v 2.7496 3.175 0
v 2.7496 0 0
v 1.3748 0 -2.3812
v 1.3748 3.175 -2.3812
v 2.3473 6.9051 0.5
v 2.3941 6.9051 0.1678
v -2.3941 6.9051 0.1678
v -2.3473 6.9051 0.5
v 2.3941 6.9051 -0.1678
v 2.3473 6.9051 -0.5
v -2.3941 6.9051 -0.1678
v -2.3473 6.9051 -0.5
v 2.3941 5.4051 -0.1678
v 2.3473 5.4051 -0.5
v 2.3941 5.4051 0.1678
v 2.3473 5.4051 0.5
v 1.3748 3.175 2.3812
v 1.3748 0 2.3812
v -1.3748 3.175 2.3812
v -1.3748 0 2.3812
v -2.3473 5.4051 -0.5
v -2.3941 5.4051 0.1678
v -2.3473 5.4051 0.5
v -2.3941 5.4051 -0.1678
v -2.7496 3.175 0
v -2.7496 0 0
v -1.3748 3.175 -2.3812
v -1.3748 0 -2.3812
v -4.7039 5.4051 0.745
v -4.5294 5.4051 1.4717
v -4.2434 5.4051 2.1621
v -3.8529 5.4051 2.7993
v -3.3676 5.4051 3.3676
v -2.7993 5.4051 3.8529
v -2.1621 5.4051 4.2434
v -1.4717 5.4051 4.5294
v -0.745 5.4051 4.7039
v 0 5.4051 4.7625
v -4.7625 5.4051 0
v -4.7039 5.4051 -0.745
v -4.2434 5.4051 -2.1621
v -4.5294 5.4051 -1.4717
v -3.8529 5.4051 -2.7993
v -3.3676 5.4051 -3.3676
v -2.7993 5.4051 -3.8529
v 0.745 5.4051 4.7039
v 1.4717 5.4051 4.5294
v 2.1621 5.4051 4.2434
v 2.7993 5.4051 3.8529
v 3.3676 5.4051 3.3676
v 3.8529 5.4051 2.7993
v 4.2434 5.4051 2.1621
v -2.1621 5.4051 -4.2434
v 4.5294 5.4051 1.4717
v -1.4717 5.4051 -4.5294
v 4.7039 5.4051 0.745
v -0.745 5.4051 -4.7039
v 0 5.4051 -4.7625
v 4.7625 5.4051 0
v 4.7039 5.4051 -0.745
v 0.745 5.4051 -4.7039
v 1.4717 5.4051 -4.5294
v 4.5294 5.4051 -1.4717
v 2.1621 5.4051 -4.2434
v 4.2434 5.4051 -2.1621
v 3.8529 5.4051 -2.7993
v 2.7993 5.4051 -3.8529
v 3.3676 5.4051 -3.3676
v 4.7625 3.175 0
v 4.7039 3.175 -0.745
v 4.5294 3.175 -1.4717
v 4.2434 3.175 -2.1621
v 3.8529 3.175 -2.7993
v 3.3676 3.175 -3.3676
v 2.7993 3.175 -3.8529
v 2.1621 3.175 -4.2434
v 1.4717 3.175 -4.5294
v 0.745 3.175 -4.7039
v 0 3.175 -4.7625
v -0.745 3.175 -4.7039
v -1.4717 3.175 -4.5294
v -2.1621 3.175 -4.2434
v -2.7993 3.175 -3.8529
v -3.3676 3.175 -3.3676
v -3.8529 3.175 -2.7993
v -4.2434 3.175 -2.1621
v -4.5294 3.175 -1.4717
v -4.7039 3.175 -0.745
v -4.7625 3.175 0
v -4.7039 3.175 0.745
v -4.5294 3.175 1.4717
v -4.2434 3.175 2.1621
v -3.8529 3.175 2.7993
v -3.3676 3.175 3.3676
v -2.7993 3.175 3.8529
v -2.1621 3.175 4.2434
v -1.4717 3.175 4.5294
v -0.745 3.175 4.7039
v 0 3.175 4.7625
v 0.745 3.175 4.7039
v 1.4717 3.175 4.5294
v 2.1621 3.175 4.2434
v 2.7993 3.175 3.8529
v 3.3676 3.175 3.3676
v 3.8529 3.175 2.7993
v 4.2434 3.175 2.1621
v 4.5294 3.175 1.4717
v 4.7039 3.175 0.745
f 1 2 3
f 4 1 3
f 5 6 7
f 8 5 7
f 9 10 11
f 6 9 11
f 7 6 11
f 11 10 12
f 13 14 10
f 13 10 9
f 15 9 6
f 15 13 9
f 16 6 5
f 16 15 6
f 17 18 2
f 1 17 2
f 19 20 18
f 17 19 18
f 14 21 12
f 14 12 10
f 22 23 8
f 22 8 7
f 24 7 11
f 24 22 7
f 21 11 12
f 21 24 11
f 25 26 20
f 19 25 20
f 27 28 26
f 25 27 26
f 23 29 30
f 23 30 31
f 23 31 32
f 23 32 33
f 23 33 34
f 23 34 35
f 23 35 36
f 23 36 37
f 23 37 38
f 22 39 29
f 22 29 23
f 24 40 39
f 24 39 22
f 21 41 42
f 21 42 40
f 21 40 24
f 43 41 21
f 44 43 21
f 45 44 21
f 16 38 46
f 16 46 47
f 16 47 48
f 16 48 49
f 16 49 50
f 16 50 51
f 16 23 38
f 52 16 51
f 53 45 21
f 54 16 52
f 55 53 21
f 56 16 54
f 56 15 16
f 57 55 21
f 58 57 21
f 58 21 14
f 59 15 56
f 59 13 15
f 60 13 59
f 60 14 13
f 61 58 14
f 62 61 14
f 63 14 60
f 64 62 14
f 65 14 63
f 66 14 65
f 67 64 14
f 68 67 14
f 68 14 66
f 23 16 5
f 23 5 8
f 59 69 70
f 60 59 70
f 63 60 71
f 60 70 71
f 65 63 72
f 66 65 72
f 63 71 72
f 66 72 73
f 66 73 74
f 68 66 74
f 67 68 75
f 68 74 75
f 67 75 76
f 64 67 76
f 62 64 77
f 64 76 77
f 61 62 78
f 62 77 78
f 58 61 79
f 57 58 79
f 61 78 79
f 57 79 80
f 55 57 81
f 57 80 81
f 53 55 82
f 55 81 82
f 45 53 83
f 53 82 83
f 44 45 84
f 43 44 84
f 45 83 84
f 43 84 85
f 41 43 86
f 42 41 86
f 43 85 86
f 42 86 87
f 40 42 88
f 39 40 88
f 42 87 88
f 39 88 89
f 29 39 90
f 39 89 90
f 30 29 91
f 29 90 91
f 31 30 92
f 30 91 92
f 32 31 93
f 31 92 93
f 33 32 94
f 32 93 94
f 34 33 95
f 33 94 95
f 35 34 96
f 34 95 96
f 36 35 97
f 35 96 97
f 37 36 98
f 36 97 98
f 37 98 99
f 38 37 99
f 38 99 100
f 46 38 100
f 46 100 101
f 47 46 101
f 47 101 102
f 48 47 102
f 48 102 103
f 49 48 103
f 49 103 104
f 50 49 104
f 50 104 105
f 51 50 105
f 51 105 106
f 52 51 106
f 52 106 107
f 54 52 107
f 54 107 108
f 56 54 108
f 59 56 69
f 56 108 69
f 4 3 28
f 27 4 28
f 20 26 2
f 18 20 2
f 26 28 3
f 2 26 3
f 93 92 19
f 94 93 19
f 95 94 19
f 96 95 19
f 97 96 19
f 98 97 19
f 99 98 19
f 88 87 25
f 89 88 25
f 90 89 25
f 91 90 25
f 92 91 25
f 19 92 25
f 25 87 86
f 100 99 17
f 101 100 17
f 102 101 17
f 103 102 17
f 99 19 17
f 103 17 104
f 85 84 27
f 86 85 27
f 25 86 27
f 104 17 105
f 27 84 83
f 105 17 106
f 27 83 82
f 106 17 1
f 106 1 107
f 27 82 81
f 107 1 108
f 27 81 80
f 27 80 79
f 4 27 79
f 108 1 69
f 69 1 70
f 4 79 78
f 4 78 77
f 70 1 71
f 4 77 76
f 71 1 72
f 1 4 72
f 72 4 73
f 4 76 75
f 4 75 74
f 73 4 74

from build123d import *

# Parameters (mm, degrees)
BOSS_EXTRUDE1_DEPTH = 3.175
SKETCH2_R           = 4.7625
BOSS_EXTRUDE2_DEPTH = 2.23012
BOSS_EXTRUDE3_DEPTH = 1.5


with BuildPart() as part:
    # Sketch1 → Boss-Extrude1 (new body)
    with BuildSketch(Plane(origin=(0, 0, 0), x_dir=(1, 0, 0), z_dir=(0, 1, 0))):
        Polygon((1.374815329, 2.38125), (-1.374815329, 2.38125), (-2.749630657, 0), (-1.374815329, -2.38125), (1.374815329, -2.38125), (2.749630657, 0), align=None)
    extrude(amount=BOSS_EXTRUDE1_DEPTH)

    # Sketch2 → Boss-Extrude2 (add)
    with BuildSketch(Plane(origin=(0, 3.175, 0), x_dir=(1, 0, 0), z_dir=(0, 1, 0))):
        Circle(SKETCH2_R)
    extrude(amount=BOSS_EXTRUDE2_DEPTH)

    # Sketch3 → Boss-Extrude3 (add)
    with BuildSketch(Plane(origin=(0, 5.40512, 0), x_dir=(1, 0, 0), z_dir=(0, 1, 0))):
        with BuildLine():
            Line((-2.347338919, 0.5), (2.347338919, 0.5))
            ThreePointArc((2.347338919, 0.5), (2.4, 0), (2.347338919, -0.5))
            Line((2.347338919, -0.5), (-2.347338919, -0.5))
            ThreePointArc((-2.347338919, -0.5), (-2.4, 0), (-2.347338919, 0.5))
        make_face()
    extrude(amount=BOSS_EXTRUDE3_DEPTH)


solid = part.part
